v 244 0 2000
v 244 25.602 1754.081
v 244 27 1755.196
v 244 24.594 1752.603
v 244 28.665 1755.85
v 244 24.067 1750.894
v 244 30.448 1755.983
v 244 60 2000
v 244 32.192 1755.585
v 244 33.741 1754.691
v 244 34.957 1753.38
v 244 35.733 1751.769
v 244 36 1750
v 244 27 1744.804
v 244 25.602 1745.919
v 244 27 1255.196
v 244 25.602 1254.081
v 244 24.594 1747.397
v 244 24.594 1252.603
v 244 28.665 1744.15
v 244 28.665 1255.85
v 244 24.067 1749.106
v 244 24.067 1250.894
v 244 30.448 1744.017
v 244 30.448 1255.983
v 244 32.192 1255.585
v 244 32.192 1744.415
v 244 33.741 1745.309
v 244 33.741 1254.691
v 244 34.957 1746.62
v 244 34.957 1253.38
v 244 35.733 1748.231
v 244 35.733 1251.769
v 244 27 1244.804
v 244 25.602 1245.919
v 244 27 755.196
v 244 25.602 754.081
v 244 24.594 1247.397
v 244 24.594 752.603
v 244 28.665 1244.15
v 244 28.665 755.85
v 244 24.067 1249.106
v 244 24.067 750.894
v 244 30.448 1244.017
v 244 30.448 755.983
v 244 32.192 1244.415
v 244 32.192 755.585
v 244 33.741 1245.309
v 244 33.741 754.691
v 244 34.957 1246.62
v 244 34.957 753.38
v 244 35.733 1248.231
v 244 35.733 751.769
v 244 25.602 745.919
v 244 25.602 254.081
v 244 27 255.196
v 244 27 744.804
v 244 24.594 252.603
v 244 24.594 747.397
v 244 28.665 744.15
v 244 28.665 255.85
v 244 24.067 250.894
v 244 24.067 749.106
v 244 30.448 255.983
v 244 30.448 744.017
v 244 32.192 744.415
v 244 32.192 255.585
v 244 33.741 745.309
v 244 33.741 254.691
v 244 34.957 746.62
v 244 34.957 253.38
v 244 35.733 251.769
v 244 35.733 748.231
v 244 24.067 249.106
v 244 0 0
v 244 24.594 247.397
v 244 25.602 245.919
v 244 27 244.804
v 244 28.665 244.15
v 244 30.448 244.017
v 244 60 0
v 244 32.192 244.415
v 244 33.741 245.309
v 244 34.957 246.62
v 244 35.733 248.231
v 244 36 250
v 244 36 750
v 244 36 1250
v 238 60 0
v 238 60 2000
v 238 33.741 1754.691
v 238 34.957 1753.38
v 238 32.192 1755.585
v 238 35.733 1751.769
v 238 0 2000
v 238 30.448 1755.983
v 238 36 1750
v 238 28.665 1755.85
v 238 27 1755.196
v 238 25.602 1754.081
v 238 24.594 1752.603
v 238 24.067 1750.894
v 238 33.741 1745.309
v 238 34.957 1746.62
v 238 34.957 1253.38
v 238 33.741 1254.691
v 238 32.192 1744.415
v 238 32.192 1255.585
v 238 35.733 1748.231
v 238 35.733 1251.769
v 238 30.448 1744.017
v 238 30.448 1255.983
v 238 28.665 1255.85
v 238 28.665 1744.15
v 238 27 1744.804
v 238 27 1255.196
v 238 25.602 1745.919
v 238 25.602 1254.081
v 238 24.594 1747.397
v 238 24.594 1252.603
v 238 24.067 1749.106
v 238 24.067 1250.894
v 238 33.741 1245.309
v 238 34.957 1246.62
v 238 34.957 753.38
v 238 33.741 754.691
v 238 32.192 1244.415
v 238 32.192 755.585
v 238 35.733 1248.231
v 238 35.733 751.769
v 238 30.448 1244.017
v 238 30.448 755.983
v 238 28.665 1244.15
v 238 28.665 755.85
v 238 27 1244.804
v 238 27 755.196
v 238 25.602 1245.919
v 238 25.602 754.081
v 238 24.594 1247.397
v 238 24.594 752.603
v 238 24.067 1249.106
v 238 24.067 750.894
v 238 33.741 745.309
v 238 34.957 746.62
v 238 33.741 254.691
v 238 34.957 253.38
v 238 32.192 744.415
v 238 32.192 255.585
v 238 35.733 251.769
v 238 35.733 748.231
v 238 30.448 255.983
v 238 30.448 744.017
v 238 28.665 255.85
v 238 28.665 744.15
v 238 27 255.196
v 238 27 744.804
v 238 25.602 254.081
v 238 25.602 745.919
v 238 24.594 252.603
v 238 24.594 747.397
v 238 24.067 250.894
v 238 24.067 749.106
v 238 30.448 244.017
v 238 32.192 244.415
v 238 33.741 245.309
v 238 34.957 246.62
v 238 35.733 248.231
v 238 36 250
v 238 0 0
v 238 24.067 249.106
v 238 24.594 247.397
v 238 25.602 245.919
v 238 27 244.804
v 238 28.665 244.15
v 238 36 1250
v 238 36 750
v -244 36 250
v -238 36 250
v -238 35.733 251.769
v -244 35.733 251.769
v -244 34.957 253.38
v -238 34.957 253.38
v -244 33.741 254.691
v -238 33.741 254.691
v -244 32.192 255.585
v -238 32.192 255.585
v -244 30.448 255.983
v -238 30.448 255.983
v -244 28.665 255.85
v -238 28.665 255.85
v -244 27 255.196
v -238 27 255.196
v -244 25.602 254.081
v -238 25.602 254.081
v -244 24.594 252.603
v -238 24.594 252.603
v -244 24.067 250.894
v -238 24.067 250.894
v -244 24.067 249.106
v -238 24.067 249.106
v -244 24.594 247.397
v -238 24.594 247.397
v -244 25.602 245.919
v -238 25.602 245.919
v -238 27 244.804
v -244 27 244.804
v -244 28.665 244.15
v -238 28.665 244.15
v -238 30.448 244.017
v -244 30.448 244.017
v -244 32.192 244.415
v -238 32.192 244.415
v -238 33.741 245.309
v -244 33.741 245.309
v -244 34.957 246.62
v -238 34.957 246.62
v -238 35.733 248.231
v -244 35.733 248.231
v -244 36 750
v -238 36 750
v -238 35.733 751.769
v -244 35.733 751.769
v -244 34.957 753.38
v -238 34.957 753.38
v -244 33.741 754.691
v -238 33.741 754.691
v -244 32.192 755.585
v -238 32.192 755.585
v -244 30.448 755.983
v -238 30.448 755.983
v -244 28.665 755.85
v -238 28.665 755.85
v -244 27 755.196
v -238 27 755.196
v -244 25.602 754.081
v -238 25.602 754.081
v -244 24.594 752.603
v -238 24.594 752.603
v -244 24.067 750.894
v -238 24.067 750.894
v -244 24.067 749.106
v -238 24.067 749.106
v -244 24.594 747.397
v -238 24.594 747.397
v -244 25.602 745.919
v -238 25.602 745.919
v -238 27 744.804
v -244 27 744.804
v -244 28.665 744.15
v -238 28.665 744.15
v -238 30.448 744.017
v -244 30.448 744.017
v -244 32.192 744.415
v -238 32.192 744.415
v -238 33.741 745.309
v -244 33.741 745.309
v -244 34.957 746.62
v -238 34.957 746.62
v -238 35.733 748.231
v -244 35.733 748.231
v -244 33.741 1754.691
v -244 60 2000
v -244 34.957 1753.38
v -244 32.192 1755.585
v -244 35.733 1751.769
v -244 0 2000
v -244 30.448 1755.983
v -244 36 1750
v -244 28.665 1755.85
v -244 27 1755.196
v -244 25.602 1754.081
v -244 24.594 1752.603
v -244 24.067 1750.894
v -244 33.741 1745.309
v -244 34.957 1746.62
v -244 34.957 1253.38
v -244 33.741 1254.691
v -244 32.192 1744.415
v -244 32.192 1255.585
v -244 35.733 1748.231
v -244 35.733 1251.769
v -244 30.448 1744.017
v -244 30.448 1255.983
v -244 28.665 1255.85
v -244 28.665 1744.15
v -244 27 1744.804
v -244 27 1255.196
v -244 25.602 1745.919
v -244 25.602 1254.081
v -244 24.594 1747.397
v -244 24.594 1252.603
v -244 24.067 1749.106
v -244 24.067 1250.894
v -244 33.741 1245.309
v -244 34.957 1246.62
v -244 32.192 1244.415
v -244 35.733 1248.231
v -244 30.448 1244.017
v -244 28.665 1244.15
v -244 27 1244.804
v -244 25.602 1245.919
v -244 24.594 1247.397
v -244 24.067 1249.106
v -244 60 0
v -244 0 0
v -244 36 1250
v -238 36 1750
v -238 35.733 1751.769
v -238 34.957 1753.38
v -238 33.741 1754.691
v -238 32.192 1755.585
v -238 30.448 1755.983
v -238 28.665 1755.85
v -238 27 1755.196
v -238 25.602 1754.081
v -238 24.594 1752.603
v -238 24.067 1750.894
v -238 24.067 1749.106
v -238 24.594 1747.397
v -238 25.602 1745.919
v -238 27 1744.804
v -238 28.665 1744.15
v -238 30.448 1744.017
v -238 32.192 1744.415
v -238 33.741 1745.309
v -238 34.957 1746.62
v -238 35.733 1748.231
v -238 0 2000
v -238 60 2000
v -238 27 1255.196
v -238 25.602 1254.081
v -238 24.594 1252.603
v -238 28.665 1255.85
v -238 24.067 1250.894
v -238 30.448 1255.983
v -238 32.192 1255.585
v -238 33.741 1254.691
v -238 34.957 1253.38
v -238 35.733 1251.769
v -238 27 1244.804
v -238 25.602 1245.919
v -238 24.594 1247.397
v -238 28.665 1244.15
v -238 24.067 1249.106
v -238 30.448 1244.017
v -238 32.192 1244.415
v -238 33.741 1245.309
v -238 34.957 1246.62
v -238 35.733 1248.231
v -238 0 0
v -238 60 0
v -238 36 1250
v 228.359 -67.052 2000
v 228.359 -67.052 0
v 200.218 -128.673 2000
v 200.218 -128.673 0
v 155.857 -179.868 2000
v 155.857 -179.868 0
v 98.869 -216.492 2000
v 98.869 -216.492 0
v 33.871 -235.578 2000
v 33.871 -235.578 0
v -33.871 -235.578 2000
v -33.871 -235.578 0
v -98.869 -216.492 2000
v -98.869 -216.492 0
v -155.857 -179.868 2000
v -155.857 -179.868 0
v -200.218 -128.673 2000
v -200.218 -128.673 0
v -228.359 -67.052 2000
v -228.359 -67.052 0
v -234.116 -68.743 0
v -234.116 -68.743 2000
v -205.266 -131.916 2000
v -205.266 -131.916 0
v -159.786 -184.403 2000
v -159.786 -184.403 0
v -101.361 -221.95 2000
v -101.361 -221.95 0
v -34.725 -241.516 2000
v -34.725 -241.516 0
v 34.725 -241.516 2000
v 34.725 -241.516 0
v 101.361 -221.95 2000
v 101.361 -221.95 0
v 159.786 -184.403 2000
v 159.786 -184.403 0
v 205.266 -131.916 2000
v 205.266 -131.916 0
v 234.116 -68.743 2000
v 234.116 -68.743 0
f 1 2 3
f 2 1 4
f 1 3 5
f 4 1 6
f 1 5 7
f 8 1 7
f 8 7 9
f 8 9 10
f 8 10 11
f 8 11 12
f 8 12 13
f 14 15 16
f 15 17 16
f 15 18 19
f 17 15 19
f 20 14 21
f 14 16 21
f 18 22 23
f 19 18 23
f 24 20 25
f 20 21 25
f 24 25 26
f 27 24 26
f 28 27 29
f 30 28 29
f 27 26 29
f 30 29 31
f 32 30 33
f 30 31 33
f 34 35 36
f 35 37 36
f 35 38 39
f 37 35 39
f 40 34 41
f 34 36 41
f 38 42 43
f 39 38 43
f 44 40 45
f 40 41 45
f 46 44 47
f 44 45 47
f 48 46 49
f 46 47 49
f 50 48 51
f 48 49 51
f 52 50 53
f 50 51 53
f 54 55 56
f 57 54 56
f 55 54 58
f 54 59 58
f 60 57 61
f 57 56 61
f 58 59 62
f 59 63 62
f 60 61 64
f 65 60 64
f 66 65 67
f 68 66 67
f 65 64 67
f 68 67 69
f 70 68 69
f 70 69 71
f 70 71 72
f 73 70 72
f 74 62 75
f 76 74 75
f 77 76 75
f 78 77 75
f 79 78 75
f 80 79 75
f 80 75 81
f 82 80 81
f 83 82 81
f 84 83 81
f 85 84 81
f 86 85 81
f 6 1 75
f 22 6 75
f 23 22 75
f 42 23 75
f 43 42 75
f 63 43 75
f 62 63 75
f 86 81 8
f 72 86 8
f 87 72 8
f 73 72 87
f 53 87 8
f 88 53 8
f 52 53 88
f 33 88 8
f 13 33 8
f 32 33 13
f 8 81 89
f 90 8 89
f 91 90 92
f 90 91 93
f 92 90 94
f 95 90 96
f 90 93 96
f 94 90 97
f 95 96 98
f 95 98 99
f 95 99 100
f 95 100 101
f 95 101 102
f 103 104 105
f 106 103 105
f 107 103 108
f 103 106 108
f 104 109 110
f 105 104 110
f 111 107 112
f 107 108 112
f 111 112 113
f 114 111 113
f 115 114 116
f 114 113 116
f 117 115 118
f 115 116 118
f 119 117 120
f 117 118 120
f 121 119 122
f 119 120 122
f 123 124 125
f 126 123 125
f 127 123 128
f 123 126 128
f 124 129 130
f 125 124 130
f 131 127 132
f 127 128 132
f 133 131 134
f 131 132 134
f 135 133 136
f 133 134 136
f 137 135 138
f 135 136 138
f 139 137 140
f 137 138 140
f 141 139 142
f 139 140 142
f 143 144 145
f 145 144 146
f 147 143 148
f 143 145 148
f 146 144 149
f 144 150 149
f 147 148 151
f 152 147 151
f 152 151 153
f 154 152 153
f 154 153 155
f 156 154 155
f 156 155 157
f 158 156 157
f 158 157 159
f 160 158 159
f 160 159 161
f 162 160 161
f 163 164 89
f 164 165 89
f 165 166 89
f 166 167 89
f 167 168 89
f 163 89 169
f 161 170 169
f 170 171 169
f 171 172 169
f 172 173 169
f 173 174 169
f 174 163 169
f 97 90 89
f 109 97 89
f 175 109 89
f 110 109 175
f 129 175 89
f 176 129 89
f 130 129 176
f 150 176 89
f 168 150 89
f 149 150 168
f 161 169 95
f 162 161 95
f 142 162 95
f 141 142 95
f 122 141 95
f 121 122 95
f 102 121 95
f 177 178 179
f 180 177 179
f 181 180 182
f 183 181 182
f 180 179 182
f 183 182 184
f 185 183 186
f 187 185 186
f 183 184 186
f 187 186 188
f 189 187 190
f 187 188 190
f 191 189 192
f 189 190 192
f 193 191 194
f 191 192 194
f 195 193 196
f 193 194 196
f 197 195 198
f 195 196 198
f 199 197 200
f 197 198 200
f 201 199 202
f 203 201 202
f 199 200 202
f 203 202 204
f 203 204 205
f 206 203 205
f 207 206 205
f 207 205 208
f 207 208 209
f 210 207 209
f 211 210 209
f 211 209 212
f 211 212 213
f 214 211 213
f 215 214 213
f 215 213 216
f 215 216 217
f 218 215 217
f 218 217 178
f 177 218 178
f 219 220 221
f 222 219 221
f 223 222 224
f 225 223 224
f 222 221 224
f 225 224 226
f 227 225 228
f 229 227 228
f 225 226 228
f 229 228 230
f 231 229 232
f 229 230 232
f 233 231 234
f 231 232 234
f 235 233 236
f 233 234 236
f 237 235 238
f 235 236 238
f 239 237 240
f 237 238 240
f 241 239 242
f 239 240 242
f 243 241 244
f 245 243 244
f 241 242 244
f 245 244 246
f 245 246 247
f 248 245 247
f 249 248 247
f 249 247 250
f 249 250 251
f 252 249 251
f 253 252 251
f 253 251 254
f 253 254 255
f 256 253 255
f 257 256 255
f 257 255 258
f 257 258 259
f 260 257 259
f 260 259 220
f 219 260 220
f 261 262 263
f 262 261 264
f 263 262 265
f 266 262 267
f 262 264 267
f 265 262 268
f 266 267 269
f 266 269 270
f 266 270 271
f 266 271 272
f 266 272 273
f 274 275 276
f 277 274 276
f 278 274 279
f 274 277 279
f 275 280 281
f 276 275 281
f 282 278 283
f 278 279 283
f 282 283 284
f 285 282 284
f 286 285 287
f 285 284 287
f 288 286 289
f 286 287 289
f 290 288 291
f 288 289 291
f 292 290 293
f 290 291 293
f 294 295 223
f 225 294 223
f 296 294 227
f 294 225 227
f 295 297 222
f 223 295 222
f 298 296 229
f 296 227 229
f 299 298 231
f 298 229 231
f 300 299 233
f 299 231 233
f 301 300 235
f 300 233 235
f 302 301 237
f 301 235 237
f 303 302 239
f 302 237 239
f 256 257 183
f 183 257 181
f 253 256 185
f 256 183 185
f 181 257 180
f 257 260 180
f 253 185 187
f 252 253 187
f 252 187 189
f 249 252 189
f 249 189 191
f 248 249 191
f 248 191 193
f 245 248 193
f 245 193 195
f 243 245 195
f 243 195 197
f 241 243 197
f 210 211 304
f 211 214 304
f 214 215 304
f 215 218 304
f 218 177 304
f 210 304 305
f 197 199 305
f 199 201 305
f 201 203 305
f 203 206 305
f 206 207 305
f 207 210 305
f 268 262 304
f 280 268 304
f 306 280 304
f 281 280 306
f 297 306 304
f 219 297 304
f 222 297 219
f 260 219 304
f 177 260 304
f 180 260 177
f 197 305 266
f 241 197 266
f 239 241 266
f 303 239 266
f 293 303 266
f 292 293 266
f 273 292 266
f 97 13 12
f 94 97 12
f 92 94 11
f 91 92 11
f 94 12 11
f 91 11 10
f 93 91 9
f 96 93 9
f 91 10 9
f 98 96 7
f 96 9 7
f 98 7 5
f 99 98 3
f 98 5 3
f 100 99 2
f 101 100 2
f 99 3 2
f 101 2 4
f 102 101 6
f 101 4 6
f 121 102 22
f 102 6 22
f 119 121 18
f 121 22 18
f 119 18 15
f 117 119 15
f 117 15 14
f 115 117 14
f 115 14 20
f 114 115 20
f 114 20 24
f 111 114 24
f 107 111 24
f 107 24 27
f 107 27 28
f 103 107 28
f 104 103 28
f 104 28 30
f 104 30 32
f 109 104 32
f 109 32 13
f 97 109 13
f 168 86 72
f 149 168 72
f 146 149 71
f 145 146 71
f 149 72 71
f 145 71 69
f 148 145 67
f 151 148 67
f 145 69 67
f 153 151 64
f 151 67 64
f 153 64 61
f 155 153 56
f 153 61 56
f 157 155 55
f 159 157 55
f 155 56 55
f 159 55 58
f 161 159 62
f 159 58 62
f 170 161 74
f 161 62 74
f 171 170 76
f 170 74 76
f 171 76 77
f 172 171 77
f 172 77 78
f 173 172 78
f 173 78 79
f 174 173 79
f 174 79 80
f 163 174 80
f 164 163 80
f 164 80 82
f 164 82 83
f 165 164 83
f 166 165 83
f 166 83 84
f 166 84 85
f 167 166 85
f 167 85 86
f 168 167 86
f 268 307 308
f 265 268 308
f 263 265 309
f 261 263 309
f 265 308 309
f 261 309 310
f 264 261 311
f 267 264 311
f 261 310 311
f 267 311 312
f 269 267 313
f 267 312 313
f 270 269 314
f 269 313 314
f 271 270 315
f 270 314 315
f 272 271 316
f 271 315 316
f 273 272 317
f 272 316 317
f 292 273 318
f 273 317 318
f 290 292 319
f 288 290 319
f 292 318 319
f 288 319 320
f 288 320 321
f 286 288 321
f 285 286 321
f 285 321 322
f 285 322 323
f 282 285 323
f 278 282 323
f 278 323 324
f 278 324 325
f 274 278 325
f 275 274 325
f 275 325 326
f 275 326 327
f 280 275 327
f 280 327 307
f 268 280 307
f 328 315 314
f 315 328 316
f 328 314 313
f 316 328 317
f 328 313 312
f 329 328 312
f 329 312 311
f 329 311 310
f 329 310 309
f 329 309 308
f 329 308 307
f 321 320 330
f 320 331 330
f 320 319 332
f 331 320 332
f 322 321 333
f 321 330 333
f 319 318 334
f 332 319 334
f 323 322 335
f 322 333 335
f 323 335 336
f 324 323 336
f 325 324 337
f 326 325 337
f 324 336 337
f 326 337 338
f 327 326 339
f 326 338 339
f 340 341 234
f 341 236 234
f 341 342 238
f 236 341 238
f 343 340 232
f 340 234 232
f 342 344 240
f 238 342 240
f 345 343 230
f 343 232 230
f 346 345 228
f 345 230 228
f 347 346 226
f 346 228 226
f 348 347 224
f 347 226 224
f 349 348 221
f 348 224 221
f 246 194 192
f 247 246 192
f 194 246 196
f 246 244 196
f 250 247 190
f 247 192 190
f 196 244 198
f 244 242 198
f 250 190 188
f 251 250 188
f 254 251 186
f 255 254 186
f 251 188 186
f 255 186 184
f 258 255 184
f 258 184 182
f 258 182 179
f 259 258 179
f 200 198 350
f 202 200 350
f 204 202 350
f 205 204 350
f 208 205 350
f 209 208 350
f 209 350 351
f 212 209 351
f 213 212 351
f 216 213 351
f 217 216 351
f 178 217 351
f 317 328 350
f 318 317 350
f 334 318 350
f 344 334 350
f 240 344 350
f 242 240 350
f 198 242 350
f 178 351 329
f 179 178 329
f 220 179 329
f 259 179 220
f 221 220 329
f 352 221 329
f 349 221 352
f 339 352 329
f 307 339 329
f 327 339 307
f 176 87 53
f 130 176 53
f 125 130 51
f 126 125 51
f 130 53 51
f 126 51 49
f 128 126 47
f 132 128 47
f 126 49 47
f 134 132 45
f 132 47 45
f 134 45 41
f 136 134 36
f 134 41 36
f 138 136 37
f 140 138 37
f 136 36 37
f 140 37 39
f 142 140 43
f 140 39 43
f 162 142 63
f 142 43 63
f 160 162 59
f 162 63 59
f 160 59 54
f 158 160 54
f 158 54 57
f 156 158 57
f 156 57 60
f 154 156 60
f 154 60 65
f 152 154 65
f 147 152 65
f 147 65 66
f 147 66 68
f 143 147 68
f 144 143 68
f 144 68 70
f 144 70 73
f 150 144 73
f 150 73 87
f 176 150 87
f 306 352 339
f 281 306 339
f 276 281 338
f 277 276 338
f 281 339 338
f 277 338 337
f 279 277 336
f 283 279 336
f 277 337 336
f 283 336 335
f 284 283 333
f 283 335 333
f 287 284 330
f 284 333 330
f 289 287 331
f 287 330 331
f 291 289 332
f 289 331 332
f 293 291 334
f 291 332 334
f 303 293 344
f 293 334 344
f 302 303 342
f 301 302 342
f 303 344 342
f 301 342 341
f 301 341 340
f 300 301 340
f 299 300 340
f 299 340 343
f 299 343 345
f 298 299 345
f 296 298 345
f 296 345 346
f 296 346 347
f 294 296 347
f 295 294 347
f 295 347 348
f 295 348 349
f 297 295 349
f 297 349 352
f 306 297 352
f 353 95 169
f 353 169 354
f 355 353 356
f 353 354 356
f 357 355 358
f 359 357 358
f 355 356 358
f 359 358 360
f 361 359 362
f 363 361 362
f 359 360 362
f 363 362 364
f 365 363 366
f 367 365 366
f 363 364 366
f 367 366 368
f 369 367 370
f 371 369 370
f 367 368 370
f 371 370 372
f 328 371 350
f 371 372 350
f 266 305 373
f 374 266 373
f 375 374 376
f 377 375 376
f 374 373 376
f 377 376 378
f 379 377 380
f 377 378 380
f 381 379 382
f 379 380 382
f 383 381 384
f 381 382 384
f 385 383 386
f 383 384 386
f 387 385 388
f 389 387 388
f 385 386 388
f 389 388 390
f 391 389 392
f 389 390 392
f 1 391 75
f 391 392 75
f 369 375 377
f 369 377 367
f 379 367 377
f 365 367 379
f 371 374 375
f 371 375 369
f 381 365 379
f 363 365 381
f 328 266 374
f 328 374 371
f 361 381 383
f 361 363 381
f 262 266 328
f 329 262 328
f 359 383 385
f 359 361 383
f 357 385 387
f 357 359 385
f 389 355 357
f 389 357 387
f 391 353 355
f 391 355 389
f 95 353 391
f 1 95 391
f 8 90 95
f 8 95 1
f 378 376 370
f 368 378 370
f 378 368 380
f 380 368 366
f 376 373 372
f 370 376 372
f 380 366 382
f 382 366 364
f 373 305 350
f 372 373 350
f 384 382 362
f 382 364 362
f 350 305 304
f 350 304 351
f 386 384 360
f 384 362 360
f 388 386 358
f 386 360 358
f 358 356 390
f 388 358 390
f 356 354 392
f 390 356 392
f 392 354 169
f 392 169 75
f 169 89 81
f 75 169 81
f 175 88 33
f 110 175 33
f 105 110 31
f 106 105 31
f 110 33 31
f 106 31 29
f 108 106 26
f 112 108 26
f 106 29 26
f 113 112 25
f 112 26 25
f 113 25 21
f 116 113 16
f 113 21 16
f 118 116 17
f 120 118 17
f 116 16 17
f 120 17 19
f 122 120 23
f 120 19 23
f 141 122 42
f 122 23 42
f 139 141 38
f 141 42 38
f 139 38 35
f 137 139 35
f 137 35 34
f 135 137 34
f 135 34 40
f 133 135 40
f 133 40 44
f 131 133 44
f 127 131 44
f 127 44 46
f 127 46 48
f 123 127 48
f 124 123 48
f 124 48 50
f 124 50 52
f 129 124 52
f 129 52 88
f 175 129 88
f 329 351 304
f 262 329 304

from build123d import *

# Parameters (mm, degrees)
F1_DEPTH = 2000
F2_R     = 6
F3_DEPTH = 488.001


with BuildPart() as f1:
    # F0 (on Top) → F1 (new body)
    with BuildSketch(Plane.XY):
        with BuildLine():
            ThreePointArc((238, 0), (0, -238), (-238, 0))
            Line((-238, 0), (-238, 60))
            Line((-238, 60), (-244, 60))
            Line((-244, 60), (-244, 0))
            ThreePointArc((-244, 0), (0, -244), (244, 0))
            Line((244, 0), (244, 60))
            Line((244, 60), (238, 60))
            Line((238, 60), (238, 0))
        make_face()
    extrude(amount=F1_DEPTH)

    # F2 (on face) → F3 (cut, through all)
    with BuildSketch(Plane.YZ.offset(244)):
        with Locations((30, 1750)):
            Circle(F2_R)
        with Locations((30, 1250)):
            Circle(F2_R)
        with Locations((30, 750)):
            Circle(F2_R)
        with Locations((30, 250)):
            Circle(F2_R)
    extrude(amount=-F3_DEPTH, mode=Mode.SUBTRACT)


solid = f1.part
